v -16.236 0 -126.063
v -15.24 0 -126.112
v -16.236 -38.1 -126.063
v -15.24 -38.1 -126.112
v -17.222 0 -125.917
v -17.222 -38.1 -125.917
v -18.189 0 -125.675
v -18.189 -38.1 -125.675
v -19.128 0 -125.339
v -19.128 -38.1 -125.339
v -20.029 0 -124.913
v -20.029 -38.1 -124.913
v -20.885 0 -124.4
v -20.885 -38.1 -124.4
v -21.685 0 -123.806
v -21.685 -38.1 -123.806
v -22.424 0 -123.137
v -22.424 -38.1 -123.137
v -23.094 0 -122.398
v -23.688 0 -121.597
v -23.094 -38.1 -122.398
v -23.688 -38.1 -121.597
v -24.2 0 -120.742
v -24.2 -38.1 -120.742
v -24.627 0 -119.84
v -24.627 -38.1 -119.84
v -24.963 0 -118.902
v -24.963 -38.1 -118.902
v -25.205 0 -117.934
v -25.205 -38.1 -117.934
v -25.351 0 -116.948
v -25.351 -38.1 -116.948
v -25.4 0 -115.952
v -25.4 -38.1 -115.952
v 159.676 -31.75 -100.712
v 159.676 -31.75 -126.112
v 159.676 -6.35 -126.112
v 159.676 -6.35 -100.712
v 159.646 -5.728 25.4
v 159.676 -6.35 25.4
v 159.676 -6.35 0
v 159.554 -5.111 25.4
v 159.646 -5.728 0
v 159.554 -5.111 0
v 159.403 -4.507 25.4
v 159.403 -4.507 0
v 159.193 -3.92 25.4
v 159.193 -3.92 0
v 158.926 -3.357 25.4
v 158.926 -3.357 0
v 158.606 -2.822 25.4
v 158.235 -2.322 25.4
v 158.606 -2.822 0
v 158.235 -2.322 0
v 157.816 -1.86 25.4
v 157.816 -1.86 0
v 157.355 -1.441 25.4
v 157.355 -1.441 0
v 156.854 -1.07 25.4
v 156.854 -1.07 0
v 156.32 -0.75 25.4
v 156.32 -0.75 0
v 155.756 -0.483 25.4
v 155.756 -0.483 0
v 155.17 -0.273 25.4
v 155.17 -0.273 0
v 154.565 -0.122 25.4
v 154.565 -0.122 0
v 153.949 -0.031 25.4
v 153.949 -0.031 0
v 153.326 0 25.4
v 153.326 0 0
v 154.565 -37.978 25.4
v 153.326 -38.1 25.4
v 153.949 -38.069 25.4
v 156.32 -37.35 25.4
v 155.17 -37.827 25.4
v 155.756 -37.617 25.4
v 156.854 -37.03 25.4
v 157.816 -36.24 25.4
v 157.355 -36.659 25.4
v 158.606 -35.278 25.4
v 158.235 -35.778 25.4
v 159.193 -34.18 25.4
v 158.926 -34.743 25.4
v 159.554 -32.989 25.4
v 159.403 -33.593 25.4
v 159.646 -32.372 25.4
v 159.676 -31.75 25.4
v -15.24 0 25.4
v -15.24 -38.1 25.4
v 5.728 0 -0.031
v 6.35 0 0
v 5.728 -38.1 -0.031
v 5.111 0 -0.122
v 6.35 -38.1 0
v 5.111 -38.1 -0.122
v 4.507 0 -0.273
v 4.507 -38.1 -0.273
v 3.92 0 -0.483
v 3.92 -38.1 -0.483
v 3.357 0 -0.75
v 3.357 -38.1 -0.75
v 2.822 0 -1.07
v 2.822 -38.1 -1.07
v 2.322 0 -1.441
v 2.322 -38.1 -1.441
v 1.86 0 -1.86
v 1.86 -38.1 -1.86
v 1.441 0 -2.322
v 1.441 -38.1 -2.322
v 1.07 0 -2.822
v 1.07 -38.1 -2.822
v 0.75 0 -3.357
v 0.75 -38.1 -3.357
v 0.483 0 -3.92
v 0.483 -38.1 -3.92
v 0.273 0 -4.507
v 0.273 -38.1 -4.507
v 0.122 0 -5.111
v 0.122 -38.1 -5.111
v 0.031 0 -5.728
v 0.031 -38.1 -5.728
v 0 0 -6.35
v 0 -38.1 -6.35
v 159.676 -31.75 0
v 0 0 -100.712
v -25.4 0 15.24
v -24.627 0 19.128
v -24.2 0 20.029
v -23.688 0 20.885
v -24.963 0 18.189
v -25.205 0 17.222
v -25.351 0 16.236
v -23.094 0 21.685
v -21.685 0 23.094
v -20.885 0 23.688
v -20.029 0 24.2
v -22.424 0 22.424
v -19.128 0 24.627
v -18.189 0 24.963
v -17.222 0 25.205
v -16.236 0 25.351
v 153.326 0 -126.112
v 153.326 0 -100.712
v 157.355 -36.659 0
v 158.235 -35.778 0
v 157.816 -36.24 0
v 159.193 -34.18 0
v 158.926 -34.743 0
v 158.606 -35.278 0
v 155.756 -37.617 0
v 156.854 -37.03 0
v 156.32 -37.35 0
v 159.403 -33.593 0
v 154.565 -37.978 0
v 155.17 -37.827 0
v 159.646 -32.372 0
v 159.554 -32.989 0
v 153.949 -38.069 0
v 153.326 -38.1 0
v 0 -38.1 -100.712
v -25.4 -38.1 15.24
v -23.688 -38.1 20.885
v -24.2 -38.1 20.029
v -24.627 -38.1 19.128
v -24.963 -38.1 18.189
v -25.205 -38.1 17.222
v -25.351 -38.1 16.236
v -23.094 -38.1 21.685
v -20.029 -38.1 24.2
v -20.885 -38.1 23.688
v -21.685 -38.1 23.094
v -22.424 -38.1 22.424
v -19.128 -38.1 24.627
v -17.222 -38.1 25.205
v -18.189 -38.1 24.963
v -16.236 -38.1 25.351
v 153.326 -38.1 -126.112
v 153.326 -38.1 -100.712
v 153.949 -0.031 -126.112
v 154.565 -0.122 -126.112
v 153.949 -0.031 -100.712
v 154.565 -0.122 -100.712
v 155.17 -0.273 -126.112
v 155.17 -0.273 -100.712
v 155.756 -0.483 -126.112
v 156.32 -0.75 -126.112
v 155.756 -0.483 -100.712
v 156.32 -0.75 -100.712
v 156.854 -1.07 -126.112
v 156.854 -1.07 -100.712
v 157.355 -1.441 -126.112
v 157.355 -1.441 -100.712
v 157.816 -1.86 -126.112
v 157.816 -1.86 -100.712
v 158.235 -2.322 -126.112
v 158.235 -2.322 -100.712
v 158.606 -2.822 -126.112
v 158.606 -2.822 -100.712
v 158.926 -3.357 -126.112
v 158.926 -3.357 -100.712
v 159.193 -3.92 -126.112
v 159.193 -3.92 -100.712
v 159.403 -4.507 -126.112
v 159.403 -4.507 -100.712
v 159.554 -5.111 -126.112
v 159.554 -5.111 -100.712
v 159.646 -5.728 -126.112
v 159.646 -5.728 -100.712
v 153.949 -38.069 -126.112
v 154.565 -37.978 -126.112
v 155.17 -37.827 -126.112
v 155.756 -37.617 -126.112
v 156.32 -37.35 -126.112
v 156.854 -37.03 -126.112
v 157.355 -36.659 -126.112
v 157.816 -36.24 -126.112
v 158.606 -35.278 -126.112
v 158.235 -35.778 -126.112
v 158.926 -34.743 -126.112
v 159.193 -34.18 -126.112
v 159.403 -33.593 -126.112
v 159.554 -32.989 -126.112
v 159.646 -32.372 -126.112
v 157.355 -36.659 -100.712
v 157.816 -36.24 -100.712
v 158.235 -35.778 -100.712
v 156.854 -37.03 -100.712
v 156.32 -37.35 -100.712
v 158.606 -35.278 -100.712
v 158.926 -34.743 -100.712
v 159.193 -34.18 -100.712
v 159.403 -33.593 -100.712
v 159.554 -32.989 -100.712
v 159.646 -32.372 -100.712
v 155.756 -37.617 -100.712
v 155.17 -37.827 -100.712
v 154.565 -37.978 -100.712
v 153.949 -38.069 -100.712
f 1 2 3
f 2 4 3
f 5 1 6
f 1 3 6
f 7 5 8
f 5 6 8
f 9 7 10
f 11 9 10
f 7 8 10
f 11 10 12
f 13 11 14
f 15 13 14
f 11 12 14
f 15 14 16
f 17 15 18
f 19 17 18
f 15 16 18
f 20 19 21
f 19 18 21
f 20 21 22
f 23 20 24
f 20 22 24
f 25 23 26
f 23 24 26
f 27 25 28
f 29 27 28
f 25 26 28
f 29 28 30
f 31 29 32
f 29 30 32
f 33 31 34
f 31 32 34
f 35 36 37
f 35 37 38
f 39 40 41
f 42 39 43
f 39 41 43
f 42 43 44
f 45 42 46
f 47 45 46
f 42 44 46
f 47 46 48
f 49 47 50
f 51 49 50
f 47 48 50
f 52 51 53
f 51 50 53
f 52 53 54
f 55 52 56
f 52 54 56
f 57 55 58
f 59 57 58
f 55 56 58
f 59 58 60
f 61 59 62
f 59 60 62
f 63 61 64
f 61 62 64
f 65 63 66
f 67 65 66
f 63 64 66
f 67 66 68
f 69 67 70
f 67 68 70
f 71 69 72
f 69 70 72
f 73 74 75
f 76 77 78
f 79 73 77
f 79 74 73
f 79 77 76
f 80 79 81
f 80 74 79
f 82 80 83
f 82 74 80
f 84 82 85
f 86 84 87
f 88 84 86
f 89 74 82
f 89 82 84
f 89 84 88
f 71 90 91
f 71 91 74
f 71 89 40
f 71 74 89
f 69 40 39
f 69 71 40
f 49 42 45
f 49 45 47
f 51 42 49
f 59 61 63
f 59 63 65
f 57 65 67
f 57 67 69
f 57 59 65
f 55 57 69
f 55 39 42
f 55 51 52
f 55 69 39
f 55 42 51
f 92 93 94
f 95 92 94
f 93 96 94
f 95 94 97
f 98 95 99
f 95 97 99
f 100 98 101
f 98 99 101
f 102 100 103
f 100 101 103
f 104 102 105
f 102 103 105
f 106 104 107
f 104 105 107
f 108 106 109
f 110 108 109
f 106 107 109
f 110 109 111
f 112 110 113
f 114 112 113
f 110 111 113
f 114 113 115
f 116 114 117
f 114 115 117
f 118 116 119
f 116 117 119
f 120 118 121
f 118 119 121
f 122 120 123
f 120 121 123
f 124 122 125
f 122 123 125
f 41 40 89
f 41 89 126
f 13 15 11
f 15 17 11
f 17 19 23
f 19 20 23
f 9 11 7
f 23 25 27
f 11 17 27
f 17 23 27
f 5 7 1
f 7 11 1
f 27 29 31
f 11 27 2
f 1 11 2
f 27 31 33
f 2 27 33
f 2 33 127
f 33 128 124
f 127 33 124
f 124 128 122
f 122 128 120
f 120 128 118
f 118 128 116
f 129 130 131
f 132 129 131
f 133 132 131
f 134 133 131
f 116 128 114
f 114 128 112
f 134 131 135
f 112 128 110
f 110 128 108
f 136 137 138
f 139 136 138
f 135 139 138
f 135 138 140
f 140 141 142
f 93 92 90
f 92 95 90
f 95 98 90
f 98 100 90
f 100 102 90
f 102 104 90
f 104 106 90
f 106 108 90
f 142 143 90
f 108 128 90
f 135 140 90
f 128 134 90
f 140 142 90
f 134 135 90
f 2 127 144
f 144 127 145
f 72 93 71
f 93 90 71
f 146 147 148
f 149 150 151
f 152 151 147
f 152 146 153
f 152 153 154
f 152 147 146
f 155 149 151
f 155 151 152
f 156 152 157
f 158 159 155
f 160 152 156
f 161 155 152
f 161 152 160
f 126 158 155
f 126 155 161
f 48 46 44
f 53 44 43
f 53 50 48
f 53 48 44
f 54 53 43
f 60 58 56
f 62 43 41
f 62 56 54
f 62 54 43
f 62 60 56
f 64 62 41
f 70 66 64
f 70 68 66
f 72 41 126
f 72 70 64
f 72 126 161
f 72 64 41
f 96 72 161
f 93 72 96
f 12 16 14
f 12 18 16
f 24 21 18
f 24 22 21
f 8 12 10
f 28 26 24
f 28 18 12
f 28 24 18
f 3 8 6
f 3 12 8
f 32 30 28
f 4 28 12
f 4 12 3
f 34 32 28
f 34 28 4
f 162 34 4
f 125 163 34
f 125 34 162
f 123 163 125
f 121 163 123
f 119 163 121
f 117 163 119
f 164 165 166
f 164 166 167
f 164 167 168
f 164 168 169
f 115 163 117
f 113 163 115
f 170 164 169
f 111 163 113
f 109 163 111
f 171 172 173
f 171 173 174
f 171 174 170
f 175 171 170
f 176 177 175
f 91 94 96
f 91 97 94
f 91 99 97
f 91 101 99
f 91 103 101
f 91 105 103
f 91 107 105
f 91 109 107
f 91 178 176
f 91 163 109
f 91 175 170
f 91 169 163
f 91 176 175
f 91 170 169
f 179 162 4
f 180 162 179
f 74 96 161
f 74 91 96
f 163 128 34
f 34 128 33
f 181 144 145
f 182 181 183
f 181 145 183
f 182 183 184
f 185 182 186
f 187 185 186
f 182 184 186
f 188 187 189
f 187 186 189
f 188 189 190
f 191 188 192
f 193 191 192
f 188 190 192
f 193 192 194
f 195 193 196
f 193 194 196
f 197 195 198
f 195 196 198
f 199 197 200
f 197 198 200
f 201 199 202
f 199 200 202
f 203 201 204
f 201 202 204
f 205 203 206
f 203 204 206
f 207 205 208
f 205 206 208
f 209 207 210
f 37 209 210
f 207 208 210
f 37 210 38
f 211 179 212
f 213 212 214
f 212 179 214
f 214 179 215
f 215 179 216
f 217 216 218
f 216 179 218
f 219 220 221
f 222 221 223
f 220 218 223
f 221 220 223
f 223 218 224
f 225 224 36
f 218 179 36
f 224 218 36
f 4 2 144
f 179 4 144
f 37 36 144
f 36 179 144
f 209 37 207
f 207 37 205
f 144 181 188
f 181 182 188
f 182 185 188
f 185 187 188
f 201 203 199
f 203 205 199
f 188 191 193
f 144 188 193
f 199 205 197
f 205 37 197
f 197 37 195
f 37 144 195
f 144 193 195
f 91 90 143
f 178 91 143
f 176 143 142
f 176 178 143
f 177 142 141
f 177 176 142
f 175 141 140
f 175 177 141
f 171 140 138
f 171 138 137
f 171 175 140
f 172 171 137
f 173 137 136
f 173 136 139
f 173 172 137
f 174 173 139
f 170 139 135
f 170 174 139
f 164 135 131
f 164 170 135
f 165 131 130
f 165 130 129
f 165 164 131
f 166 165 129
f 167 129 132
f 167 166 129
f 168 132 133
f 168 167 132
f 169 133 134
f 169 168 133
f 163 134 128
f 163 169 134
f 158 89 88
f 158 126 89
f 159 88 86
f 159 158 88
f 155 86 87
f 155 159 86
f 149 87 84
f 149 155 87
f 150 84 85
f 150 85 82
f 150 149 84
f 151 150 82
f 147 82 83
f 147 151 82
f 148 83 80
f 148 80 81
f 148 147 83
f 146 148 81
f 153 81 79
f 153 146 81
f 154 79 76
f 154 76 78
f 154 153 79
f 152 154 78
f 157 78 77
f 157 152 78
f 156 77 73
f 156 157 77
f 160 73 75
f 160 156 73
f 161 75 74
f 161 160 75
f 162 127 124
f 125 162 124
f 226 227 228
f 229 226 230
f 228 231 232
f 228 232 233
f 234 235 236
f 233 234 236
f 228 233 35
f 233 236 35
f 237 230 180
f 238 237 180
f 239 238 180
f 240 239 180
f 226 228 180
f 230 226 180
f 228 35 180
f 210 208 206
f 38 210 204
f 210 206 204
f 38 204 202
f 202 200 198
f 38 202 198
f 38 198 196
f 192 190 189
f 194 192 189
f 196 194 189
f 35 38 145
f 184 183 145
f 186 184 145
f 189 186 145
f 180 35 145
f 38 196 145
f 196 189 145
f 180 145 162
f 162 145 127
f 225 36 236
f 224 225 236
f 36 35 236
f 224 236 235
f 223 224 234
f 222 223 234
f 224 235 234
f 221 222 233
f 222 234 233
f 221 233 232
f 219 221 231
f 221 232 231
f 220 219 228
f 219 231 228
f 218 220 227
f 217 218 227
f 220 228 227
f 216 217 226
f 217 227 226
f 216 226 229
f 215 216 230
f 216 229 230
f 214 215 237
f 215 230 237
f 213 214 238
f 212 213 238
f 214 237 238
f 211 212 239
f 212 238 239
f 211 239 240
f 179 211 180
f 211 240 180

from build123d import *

# Parameters (mm, degrees)
EXTRUDE4_DEPTH       = 38.1
FILLET1_R            = 6.35
FILLET2_R            = 10.16
FILLET2_OF_MIRROR1_R = 10.16
FILLET4_R            = 6.35


with BuildPart() as part:
    # Sketch4 → Extrude4 (new body)
    with BuildSketch(Plane(origin=(0, 0, 0), x_dir=(1, 0, 0), z_dir=(0, 1, 0))):
        Polygon((-25.4, -25.4), (159.67622317, -25.4), (159.67622317, 0), (0, 0), (0, 50.356184866), (-25.4, 50.356184866), align=None)
    extrude4 = extrude(amount=-EXTRUDE4_DEPTH)

    # Fillet1
    fillet1_edges = [part.edges().sort_by_distance(p)[0] for p in [
        (0, -19.05, 0),
        (159.67622317, -38.1, 12.7),
        (159.67622317, 0, 12.7),
    ]]
    fillet(fillet1_edges, radius=FILLET1_R)

    # Fillet2
    fillet2_edges = [part.edges().sort_by_distance(p)[0] for p in [
        (-25.4, -19.05, 25.4),
    ]]
    fillet(fillet2_edges, radius=FILLET2_R)

    # Mirror1: Extrude4 across plane
    add(extrude4.mirror(Plane(origin=(-25.4, -38.1, -50.356184866), x_dir=(1, 0, 0), z_dir=(0, 0, -1))))

    # Fillet2 of Mirror1
    fillet2_of_mirror1_edges = [part.edges().sort_by_distance(p)[0] for p in [
        (-25.4, -19.05, -126.112369731),
    ]]
    fillet(fillet2_of_mirror1_edges, radius=FILLET2_OF_MIRROR1_R)

    # Fillet4
    fillet4_edges = [part.edges().sort_by_distance(p)[0] for p in [
        (159.67622317, 0, -113.412369731),
        (159.67622317, -38.1, -113.412369731),
    ]]
    fillet(fillet4_edges, radius=FILLET4_R)


solid = part.part
